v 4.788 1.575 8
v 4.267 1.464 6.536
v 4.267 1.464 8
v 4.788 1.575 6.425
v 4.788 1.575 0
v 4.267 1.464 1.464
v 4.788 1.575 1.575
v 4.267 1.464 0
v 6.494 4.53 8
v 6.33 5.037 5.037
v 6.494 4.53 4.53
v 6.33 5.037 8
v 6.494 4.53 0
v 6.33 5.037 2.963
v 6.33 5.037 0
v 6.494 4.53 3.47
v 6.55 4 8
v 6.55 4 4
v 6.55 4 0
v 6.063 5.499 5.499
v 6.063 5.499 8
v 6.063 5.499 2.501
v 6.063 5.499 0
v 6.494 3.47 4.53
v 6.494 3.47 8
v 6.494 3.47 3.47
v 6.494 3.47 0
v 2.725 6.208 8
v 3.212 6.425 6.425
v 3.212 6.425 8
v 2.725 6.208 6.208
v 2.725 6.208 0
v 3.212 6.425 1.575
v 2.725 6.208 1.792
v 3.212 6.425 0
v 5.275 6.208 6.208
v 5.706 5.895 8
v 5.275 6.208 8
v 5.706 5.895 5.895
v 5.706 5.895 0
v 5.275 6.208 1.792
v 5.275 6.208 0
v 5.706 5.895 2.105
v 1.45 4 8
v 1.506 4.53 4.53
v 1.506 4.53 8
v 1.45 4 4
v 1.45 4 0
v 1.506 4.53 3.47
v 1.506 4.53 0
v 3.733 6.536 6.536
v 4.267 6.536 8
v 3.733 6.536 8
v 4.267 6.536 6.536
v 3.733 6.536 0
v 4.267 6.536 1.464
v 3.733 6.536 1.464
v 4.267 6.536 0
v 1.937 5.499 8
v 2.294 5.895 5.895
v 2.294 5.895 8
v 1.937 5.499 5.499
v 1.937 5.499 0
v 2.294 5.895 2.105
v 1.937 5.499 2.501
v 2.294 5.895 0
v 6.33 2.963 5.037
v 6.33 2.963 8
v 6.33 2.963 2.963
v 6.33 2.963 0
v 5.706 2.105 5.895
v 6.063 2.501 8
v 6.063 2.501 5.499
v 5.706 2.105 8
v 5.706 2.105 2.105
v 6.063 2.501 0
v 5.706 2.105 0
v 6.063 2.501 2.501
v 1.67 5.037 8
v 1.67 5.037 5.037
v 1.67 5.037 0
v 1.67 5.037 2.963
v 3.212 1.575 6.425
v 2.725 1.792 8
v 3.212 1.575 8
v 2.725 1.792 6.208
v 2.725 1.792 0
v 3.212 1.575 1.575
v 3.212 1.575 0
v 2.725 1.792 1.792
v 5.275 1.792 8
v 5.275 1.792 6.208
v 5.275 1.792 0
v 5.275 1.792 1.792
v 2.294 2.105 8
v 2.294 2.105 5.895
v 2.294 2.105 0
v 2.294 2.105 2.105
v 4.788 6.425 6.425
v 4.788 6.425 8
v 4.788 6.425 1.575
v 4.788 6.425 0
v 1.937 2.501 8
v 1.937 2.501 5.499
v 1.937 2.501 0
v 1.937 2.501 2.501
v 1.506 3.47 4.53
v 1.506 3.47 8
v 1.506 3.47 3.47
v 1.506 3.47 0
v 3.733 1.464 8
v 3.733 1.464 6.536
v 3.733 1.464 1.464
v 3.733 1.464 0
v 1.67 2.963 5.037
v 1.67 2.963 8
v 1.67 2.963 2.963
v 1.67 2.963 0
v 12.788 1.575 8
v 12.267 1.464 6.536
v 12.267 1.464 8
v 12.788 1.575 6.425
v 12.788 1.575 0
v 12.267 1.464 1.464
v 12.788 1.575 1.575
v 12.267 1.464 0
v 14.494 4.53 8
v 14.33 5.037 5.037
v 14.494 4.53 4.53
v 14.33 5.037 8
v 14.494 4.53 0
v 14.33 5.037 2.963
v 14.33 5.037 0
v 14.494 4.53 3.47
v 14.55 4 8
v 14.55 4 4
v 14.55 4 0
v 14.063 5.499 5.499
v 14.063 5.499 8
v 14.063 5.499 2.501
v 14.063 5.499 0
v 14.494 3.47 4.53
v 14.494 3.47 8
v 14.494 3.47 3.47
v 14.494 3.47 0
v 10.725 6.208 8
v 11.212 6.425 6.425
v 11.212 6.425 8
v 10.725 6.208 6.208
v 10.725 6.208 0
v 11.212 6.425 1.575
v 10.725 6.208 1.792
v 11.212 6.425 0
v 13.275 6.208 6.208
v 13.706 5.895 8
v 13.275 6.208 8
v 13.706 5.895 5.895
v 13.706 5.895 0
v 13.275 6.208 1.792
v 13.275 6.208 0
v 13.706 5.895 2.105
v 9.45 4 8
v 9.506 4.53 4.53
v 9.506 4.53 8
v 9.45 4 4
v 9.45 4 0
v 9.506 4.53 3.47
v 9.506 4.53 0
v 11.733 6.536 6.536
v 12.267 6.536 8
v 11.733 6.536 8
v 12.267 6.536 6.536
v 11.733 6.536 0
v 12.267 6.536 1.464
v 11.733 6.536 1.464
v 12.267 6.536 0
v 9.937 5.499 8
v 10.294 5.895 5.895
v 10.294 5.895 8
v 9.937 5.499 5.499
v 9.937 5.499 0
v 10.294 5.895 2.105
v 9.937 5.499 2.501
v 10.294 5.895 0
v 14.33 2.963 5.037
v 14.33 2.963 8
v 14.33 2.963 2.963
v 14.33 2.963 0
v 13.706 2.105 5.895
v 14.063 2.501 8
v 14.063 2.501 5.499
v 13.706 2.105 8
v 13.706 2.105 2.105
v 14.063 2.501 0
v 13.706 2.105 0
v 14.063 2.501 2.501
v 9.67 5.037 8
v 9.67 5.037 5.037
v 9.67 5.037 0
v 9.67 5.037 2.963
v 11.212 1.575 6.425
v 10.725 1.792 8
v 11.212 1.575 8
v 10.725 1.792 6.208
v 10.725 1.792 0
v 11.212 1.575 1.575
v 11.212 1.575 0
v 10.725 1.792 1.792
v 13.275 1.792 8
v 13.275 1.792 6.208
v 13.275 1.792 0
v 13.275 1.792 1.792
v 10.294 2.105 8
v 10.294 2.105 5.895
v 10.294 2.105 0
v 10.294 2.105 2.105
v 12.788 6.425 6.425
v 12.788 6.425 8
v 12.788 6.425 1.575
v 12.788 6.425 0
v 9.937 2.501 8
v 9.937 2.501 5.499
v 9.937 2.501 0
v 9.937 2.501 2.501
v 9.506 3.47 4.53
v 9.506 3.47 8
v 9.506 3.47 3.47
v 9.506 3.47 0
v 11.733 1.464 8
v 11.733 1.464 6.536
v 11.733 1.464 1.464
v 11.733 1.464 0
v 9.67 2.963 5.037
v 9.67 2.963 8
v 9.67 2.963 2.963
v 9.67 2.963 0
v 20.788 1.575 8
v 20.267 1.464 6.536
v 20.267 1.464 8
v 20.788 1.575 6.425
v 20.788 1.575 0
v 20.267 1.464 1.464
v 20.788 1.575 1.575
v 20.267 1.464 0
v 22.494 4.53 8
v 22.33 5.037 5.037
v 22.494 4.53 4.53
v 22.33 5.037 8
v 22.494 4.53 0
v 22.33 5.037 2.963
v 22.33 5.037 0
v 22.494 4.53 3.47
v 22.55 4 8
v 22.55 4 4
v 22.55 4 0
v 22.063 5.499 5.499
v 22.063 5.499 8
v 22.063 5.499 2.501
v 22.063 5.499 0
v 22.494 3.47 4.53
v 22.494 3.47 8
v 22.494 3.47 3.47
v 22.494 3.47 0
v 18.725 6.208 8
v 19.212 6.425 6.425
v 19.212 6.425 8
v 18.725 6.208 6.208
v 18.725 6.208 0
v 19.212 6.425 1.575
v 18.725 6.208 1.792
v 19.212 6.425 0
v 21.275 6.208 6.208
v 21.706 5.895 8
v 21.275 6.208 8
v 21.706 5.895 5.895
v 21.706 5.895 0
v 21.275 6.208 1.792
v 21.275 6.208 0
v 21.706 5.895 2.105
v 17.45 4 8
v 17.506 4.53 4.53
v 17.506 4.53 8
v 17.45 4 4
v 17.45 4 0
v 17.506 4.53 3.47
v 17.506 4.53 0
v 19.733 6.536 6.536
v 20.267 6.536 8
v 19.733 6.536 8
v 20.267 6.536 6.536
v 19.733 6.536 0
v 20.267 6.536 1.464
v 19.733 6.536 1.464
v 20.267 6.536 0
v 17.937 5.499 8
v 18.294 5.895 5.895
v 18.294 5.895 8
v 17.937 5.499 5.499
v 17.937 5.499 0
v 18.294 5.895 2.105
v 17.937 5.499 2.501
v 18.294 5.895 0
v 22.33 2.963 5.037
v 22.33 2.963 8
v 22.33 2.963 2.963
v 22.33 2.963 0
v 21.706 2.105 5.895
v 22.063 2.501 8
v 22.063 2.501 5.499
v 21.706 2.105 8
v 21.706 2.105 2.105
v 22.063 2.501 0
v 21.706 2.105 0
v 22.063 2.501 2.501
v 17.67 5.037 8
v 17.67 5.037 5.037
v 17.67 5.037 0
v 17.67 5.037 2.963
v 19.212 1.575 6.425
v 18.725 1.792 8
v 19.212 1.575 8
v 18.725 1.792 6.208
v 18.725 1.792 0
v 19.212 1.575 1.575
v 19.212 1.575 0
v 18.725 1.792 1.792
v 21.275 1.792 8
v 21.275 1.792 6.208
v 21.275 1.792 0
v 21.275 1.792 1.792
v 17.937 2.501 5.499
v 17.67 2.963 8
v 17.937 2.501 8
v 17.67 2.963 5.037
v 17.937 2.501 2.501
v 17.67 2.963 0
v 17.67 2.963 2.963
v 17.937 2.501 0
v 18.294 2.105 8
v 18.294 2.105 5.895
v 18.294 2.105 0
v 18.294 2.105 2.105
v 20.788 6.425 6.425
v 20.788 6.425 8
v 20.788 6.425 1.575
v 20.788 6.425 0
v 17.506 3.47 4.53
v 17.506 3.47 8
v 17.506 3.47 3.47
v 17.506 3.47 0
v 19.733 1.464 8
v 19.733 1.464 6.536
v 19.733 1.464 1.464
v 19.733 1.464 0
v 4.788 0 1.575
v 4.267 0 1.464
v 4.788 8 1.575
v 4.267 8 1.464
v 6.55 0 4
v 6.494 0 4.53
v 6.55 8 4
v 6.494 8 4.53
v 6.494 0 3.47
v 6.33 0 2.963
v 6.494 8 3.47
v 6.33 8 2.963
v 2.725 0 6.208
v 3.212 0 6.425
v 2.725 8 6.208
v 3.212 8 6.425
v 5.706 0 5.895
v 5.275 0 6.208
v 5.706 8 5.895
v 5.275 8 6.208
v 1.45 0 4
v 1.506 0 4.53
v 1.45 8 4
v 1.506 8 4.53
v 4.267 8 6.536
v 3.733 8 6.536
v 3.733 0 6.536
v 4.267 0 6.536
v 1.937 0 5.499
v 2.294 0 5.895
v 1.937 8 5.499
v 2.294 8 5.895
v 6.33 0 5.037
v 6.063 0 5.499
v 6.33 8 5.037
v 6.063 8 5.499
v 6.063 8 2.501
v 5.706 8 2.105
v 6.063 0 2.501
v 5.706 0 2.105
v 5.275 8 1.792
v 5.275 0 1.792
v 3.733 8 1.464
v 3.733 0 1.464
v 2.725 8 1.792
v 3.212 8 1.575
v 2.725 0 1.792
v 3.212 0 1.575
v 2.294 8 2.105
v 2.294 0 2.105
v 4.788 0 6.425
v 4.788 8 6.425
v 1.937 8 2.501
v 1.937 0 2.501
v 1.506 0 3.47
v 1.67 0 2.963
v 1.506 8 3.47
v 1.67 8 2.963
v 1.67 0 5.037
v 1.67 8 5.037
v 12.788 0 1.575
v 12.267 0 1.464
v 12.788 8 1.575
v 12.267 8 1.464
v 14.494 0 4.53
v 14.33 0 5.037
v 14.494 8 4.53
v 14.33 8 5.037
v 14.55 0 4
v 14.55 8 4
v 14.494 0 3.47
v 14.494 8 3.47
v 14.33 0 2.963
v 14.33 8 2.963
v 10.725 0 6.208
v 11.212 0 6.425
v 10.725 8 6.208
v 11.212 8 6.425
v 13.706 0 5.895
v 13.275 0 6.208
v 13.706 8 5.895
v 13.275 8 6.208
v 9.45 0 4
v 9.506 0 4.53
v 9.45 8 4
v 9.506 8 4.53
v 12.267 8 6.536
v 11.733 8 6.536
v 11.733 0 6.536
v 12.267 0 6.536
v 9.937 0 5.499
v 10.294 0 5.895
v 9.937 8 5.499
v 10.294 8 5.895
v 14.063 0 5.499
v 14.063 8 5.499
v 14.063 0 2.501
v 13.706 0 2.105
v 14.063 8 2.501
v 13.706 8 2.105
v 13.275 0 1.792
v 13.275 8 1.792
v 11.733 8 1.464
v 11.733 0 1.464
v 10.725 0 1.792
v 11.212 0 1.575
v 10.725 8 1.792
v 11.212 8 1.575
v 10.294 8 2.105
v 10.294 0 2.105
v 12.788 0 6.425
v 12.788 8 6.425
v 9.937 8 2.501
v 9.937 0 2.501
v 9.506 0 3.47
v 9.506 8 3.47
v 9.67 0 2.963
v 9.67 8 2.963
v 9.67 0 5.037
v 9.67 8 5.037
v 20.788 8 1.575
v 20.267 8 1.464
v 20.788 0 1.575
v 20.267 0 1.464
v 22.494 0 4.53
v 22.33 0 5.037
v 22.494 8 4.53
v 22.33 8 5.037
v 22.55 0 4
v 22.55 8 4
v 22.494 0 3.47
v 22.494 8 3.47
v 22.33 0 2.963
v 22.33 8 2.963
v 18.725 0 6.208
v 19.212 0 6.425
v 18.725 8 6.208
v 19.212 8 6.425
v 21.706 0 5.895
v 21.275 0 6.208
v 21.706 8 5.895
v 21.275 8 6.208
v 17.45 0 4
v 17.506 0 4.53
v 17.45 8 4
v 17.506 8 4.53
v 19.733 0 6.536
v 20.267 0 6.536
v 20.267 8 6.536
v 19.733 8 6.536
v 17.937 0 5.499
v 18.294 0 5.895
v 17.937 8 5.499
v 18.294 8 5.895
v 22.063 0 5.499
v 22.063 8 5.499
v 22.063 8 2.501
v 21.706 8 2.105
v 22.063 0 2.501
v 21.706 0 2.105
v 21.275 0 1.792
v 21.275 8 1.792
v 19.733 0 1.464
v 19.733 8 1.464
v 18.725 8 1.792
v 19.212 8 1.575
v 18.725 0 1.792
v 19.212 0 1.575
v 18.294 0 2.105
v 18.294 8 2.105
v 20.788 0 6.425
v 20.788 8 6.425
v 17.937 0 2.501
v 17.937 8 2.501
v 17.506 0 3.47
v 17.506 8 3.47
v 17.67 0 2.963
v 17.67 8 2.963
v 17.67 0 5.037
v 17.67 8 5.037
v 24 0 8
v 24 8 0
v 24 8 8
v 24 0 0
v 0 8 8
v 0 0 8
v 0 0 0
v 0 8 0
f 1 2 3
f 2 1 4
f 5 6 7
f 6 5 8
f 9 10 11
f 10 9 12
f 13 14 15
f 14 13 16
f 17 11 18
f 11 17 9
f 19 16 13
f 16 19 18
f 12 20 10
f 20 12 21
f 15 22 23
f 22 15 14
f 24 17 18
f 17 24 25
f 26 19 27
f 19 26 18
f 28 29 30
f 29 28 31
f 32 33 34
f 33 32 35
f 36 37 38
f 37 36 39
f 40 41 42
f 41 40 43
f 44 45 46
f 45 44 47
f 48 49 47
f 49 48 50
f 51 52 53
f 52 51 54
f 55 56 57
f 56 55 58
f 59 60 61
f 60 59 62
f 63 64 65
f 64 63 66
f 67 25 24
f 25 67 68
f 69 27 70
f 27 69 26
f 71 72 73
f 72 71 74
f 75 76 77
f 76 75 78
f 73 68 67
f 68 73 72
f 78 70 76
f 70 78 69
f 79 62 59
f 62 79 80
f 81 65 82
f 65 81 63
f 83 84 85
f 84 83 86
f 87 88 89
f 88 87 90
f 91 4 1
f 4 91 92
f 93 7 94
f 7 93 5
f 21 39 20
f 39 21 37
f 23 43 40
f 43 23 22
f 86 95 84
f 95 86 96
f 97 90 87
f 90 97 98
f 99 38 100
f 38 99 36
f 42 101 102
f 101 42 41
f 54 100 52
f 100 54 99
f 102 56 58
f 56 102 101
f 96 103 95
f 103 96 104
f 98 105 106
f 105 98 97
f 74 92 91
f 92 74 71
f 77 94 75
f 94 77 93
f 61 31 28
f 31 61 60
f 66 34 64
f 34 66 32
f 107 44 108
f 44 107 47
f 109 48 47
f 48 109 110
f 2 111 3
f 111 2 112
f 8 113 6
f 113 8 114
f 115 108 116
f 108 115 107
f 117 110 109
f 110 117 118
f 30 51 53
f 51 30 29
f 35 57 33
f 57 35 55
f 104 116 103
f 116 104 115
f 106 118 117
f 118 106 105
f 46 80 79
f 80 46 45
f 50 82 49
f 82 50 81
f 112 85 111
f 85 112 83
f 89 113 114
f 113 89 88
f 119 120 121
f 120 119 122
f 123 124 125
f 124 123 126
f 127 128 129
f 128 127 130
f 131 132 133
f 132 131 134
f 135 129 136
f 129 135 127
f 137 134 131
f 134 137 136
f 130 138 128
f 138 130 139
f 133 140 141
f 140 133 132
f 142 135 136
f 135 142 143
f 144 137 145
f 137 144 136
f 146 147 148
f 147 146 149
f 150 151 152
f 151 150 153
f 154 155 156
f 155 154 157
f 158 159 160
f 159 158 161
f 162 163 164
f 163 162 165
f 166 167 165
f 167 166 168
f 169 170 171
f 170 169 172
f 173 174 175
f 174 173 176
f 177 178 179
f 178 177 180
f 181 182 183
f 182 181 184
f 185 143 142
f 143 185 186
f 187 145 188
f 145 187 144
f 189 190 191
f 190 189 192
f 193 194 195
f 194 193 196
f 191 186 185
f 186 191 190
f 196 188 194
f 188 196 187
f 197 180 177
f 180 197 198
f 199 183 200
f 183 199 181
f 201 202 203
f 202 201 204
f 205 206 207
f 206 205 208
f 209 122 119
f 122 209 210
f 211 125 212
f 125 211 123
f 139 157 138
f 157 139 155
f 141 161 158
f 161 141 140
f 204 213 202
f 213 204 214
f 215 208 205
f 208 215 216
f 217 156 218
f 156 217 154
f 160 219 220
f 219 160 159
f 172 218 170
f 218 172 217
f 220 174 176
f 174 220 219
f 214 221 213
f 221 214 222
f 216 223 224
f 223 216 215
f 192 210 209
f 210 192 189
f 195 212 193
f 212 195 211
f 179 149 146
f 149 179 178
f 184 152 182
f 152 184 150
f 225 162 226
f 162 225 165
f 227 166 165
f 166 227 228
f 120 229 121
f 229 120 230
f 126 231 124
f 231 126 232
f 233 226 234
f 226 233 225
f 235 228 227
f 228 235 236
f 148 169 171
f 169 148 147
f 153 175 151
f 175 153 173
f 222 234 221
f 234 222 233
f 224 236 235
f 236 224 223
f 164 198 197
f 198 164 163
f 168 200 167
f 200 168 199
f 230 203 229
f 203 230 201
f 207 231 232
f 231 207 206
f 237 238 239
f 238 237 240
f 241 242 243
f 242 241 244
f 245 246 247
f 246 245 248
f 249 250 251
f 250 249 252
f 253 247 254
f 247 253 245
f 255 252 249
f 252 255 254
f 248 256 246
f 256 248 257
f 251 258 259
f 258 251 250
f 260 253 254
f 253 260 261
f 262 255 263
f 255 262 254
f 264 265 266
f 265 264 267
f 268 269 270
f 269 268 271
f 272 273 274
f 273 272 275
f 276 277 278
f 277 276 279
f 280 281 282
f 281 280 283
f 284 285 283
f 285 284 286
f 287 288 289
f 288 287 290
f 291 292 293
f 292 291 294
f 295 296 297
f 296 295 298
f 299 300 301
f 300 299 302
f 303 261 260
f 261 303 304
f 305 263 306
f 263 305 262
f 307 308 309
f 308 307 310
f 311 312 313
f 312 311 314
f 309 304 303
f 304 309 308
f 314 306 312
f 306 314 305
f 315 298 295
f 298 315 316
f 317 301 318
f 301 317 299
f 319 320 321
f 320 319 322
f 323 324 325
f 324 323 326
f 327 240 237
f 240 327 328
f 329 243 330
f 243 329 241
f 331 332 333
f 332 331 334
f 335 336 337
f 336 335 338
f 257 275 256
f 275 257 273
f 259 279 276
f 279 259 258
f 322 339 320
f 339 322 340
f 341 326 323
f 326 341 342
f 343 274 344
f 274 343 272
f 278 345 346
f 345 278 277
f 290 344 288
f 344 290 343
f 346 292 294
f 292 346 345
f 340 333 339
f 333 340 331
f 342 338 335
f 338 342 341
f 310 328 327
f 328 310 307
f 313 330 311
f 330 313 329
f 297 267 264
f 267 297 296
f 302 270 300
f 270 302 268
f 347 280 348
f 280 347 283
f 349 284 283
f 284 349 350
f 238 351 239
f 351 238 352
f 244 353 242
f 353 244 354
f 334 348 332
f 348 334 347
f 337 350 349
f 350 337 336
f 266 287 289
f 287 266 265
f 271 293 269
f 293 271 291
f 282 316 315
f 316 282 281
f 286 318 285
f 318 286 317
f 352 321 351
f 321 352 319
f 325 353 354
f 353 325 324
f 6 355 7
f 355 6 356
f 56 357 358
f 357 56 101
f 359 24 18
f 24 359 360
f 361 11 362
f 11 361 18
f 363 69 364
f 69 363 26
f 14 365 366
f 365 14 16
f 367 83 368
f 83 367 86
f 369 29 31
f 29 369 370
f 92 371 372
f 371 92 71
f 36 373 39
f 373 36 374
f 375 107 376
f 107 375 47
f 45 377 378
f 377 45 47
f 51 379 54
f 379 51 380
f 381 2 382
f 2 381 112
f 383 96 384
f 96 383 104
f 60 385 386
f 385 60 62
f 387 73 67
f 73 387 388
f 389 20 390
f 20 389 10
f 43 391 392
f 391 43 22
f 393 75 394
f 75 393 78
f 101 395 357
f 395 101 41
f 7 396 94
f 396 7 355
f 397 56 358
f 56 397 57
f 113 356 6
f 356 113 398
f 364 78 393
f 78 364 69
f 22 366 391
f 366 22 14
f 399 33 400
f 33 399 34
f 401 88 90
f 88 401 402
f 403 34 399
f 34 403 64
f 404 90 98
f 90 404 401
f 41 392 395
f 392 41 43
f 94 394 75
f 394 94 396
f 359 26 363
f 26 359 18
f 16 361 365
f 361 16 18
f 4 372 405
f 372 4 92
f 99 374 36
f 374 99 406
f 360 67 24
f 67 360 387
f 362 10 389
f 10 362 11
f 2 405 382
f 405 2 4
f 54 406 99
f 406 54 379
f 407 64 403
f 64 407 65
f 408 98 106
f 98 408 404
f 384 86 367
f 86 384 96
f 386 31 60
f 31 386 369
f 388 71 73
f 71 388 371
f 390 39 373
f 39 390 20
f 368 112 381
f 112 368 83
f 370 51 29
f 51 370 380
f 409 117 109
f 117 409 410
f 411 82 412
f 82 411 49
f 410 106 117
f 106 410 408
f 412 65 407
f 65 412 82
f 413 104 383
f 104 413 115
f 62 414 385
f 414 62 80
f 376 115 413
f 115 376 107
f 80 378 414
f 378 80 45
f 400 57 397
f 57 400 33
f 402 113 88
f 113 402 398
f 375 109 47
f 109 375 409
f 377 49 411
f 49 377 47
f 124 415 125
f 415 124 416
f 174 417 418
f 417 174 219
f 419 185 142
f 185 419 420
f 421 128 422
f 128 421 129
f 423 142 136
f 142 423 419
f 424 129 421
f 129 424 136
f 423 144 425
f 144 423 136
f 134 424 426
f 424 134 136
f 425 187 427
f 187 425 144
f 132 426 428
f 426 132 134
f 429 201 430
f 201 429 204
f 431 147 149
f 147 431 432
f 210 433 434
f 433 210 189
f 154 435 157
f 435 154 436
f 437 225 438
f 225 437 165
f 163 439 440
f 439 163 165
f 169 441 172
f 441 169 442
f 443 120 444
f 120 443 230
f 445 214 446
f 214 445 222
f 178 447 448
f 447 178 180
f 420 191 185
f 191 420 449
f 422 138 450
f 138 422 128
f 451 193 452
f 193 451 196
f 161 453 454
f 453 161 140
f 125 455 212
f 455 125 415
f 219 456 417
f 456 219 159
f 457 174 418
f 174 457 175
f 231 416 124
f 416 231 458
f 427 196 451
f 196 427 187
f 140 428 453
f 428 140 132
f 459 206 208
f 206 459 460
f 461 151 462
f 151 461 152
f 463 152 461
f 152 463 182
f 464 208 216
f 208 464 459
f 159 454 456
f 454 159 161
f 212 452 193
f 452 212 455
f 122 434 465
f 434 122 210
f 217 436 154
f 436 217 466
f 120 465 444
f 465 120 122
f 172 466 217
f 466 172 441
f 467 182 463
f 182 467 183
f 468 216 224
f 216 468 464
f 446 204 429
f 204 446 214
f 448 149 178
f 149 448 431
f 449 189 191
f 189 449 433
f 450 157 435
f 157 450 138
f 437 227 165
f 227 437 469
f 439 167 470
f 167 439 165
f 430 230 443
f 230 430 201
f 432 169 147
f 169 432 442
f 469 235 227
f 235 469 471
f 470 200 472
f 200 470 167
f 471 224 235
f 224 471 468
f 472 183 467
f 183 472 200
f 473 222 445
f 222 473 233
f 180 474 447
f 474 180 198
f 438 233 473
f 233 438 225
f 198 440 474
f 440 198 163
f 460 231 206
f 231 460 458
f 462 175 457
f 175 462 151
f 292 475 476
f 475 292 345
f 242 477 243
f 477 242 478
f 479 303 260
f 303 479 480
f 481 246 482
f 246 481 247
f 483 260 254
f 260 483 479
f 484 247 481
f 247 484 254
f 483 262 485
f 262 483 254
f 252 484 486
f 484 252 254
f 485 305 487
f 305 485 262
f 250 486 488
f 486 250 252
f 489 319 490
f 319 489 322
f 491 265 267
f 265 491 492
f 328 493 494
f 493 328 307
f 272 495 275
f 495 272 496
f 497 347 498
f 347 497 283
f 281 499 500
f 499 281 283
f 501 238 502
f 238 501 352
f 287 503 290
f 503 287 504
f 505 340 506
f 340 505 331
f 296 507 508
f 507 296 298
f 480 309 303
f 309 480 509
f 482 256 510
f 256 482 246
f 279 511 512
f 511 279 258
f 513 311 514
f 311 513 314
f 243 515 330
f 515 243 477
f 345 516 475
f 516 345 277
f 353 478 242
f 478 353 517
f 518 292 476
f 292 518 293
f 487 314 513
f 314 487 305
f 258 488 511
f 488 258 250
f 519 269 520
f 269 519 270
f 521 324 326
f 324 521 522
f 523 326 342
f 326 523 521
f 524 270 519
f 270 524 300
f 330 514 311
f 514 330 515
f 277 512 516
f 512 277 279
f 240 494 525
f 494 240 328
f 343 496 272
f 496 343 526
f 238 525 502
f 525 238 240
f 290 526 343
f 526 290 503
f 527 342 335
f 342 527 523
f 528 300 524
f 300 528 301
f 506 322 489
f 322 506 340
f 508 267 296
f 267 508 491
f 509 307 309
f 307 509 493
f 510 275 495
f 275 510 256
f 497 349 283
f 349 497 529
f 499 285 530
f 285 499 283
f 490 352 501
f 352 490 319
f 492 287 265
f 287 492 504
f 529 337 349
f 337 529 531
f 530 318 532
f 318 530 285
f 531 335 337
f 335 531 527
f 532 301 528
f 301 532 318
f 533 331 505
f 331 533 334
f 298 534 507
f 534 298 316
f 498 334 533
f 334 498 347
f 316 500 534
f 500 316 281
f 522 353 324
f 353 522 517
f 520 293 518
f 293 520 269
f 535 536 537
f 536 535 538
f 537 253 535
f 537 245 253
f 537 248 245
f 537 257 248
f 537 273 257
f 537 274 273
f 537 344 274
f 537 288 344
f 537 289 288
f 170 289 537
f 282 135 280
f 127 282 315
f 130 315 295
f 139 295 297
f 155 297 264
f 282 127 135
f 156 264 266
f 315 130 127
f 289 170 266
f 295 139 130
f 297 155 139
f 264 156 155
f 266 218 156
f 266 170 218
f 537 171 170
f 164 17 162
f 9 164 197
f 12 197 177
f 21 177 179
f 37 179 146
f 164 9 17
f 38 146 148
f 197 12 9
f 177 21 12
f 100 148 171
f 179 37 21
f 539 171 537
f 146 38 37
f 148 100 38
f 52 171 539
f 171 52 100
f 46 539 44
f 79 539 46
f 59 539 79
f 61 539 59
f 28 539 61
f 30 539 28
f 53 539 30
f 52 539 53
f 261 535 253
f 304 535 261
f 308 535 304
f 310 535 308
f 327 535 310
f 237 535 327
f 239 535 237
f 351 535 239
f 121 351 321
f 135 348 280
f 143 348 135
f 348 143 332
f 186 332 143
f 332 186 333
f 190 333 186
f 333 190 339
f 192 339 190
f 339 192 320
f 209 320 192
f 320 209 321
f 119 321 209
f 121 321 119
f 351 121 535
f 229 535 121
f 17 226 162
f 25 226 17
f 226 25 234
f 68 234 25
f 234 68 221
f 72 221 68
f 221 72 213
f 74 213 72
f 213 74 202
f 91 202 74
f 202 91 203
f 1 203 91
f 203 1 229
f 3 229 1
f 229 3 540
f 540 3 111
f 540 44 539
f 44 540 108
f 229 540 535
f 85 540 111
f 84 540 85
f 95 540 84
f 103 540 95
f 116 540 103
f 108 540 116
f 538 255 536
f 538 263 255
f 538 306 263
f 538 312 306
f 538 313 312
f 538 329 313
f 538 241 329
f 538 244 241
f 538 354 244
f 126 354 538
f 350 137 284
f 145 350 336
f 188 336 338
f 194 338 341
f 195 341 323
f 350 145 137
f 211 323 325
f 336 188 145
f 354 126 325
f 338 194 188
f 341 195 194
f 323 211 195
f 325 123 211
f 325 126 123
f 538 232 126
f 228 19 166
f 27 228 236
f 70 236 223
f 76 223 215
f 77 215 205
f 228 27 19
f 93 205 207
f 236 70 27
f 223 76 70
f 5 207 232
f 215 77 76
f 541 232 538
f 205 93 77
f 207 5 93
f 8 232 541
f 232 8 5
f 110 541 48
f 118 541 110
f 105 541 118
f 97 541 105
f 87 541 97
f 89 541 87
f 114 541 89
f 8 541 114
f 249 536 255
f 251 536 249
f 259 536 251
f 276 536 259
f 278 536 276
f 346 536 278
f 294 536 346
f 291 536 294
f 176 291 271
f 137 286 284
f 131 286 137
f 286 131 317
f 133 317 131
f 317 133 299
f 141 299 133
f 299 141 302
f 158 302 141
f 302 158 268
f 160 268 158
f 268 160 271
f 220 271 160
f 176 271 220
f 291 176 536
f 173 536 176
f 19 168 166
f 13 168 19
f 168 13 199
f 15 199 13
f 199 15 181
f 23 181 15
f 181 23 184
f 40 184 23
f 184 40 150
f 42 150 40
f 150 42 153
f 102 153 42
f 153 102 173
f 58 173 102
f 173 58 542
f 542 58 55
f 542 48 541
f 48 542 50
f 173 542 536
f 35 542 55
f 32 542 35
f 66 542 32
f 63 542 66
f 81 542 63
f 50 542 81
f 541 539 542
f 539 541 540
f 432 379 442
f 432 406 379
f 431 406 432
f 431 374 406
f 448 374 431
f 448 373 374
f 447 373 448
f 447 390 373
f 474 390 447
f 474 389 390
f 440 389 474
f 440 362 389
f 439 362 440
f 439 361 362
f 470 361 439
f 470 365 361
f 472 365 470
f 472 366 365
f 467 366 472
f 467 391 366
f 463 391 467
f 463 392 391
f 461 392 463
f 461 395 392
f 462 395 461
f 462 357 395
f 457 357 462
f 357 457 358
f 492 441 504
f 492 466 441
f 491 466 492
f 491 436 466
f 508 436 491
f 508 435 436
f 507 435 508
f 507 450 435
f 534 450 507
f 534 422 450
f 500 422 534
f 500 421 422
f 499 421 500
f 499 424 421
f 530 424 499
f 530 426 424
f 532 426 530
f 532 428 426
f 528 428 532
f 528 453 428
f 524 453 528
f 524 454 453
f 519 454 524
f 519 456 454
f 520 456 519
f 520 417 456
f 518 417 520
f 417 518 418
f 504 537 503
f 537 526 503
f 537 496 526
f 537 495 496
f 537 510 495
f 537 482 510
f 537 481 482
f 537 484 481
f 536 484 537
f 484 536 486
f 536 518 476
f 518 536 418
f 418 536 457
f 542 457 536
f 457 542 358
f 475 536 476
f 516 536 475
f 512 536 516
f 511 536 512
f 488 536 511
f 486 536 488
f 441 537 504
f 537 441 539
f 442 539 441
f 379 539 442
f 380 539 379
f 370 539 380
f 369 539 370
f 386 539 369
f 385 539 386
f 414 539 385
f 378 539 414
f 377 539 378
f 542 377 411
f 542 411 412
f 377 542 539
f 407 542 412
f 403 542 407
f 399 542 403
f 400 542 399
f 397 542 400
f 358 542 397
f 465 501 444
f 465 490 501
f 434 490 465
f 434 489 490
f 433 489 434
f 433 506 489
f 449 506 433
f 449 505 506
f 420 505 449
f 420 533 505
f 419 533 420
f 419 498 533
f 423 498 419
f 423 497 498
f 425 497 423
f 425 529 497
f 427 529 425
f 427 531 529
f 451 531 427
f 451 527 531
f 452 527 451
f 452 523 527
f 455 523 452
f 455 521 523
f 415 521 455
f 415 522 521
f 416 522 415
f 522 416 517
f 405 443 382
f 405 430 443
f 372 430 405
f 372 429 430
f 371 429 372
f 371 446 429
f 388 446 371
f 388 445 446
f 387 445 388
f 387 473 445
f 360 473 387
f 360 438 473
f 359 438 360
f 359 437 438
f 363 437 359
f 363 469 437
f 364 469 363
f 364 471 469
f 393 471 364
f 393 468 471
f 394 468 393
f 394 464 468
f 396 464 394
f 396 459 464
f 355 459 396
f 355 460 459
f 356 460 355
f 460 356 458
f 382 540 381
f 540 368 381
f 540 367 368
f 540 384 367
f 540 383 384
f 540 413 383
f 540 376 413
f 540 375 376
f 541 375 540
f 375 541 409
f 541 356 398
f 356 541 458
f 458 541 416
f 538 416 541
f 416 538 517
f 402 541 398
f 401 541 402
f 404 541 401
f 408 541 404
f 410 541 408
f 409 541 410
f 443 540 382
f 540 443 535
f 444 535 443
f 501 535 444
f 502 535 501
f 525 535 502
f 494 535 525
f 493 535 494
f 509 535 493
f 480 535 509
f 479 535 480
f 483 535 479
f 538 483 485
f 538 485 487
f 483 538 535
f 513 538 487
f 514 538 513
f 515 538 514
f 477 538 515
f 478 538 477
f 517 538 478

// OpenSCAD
// Description: "LEGO Technic-compatible gridbeam"
// Project home: http://bitbeam.org

// Each bitbeam is 8mm inches wide. 
// Center of each hole is 8mm apart from each other
// Holes are 5.1 mm in diameter.

// Mini
//beam_width     = 4;
//hole_diameter  = 2.2;

// Standard
beam_width     = 8;
hole_diameter  = 5.1;

hole_radius    = hole_diameter / 2;

module beam(number_of_holes) {
    beam_length = number_of_holes * beam_width;
    difference() {
        // Draw the beam...
        cube([beam_length,beam_width,beam_width]);
    
        // Cut the holes...
        for (x=[beam_width/2 : beam_width : beam_length]) {
            translate([x,beam_width/2,-2])
            cylinder(r=hole_radius, h=12, $fn=30);
        }
        for (x=[beam_width/2 : beam_width : beam_length]) {
            rotate([90,0,0])
            translate([x,beam_width/2,-10])
            cylinder(r=hole_radius, h=12, $fn=30);
        }

        // Optional through-hole
        //rotate([0,90,0])
        //translate([-4,beam_width/2,-2])
        //cylinder(r=hole_radius, h=number_of_holes*beam_width+4, $fn=30);
        }
}

beam(3);
